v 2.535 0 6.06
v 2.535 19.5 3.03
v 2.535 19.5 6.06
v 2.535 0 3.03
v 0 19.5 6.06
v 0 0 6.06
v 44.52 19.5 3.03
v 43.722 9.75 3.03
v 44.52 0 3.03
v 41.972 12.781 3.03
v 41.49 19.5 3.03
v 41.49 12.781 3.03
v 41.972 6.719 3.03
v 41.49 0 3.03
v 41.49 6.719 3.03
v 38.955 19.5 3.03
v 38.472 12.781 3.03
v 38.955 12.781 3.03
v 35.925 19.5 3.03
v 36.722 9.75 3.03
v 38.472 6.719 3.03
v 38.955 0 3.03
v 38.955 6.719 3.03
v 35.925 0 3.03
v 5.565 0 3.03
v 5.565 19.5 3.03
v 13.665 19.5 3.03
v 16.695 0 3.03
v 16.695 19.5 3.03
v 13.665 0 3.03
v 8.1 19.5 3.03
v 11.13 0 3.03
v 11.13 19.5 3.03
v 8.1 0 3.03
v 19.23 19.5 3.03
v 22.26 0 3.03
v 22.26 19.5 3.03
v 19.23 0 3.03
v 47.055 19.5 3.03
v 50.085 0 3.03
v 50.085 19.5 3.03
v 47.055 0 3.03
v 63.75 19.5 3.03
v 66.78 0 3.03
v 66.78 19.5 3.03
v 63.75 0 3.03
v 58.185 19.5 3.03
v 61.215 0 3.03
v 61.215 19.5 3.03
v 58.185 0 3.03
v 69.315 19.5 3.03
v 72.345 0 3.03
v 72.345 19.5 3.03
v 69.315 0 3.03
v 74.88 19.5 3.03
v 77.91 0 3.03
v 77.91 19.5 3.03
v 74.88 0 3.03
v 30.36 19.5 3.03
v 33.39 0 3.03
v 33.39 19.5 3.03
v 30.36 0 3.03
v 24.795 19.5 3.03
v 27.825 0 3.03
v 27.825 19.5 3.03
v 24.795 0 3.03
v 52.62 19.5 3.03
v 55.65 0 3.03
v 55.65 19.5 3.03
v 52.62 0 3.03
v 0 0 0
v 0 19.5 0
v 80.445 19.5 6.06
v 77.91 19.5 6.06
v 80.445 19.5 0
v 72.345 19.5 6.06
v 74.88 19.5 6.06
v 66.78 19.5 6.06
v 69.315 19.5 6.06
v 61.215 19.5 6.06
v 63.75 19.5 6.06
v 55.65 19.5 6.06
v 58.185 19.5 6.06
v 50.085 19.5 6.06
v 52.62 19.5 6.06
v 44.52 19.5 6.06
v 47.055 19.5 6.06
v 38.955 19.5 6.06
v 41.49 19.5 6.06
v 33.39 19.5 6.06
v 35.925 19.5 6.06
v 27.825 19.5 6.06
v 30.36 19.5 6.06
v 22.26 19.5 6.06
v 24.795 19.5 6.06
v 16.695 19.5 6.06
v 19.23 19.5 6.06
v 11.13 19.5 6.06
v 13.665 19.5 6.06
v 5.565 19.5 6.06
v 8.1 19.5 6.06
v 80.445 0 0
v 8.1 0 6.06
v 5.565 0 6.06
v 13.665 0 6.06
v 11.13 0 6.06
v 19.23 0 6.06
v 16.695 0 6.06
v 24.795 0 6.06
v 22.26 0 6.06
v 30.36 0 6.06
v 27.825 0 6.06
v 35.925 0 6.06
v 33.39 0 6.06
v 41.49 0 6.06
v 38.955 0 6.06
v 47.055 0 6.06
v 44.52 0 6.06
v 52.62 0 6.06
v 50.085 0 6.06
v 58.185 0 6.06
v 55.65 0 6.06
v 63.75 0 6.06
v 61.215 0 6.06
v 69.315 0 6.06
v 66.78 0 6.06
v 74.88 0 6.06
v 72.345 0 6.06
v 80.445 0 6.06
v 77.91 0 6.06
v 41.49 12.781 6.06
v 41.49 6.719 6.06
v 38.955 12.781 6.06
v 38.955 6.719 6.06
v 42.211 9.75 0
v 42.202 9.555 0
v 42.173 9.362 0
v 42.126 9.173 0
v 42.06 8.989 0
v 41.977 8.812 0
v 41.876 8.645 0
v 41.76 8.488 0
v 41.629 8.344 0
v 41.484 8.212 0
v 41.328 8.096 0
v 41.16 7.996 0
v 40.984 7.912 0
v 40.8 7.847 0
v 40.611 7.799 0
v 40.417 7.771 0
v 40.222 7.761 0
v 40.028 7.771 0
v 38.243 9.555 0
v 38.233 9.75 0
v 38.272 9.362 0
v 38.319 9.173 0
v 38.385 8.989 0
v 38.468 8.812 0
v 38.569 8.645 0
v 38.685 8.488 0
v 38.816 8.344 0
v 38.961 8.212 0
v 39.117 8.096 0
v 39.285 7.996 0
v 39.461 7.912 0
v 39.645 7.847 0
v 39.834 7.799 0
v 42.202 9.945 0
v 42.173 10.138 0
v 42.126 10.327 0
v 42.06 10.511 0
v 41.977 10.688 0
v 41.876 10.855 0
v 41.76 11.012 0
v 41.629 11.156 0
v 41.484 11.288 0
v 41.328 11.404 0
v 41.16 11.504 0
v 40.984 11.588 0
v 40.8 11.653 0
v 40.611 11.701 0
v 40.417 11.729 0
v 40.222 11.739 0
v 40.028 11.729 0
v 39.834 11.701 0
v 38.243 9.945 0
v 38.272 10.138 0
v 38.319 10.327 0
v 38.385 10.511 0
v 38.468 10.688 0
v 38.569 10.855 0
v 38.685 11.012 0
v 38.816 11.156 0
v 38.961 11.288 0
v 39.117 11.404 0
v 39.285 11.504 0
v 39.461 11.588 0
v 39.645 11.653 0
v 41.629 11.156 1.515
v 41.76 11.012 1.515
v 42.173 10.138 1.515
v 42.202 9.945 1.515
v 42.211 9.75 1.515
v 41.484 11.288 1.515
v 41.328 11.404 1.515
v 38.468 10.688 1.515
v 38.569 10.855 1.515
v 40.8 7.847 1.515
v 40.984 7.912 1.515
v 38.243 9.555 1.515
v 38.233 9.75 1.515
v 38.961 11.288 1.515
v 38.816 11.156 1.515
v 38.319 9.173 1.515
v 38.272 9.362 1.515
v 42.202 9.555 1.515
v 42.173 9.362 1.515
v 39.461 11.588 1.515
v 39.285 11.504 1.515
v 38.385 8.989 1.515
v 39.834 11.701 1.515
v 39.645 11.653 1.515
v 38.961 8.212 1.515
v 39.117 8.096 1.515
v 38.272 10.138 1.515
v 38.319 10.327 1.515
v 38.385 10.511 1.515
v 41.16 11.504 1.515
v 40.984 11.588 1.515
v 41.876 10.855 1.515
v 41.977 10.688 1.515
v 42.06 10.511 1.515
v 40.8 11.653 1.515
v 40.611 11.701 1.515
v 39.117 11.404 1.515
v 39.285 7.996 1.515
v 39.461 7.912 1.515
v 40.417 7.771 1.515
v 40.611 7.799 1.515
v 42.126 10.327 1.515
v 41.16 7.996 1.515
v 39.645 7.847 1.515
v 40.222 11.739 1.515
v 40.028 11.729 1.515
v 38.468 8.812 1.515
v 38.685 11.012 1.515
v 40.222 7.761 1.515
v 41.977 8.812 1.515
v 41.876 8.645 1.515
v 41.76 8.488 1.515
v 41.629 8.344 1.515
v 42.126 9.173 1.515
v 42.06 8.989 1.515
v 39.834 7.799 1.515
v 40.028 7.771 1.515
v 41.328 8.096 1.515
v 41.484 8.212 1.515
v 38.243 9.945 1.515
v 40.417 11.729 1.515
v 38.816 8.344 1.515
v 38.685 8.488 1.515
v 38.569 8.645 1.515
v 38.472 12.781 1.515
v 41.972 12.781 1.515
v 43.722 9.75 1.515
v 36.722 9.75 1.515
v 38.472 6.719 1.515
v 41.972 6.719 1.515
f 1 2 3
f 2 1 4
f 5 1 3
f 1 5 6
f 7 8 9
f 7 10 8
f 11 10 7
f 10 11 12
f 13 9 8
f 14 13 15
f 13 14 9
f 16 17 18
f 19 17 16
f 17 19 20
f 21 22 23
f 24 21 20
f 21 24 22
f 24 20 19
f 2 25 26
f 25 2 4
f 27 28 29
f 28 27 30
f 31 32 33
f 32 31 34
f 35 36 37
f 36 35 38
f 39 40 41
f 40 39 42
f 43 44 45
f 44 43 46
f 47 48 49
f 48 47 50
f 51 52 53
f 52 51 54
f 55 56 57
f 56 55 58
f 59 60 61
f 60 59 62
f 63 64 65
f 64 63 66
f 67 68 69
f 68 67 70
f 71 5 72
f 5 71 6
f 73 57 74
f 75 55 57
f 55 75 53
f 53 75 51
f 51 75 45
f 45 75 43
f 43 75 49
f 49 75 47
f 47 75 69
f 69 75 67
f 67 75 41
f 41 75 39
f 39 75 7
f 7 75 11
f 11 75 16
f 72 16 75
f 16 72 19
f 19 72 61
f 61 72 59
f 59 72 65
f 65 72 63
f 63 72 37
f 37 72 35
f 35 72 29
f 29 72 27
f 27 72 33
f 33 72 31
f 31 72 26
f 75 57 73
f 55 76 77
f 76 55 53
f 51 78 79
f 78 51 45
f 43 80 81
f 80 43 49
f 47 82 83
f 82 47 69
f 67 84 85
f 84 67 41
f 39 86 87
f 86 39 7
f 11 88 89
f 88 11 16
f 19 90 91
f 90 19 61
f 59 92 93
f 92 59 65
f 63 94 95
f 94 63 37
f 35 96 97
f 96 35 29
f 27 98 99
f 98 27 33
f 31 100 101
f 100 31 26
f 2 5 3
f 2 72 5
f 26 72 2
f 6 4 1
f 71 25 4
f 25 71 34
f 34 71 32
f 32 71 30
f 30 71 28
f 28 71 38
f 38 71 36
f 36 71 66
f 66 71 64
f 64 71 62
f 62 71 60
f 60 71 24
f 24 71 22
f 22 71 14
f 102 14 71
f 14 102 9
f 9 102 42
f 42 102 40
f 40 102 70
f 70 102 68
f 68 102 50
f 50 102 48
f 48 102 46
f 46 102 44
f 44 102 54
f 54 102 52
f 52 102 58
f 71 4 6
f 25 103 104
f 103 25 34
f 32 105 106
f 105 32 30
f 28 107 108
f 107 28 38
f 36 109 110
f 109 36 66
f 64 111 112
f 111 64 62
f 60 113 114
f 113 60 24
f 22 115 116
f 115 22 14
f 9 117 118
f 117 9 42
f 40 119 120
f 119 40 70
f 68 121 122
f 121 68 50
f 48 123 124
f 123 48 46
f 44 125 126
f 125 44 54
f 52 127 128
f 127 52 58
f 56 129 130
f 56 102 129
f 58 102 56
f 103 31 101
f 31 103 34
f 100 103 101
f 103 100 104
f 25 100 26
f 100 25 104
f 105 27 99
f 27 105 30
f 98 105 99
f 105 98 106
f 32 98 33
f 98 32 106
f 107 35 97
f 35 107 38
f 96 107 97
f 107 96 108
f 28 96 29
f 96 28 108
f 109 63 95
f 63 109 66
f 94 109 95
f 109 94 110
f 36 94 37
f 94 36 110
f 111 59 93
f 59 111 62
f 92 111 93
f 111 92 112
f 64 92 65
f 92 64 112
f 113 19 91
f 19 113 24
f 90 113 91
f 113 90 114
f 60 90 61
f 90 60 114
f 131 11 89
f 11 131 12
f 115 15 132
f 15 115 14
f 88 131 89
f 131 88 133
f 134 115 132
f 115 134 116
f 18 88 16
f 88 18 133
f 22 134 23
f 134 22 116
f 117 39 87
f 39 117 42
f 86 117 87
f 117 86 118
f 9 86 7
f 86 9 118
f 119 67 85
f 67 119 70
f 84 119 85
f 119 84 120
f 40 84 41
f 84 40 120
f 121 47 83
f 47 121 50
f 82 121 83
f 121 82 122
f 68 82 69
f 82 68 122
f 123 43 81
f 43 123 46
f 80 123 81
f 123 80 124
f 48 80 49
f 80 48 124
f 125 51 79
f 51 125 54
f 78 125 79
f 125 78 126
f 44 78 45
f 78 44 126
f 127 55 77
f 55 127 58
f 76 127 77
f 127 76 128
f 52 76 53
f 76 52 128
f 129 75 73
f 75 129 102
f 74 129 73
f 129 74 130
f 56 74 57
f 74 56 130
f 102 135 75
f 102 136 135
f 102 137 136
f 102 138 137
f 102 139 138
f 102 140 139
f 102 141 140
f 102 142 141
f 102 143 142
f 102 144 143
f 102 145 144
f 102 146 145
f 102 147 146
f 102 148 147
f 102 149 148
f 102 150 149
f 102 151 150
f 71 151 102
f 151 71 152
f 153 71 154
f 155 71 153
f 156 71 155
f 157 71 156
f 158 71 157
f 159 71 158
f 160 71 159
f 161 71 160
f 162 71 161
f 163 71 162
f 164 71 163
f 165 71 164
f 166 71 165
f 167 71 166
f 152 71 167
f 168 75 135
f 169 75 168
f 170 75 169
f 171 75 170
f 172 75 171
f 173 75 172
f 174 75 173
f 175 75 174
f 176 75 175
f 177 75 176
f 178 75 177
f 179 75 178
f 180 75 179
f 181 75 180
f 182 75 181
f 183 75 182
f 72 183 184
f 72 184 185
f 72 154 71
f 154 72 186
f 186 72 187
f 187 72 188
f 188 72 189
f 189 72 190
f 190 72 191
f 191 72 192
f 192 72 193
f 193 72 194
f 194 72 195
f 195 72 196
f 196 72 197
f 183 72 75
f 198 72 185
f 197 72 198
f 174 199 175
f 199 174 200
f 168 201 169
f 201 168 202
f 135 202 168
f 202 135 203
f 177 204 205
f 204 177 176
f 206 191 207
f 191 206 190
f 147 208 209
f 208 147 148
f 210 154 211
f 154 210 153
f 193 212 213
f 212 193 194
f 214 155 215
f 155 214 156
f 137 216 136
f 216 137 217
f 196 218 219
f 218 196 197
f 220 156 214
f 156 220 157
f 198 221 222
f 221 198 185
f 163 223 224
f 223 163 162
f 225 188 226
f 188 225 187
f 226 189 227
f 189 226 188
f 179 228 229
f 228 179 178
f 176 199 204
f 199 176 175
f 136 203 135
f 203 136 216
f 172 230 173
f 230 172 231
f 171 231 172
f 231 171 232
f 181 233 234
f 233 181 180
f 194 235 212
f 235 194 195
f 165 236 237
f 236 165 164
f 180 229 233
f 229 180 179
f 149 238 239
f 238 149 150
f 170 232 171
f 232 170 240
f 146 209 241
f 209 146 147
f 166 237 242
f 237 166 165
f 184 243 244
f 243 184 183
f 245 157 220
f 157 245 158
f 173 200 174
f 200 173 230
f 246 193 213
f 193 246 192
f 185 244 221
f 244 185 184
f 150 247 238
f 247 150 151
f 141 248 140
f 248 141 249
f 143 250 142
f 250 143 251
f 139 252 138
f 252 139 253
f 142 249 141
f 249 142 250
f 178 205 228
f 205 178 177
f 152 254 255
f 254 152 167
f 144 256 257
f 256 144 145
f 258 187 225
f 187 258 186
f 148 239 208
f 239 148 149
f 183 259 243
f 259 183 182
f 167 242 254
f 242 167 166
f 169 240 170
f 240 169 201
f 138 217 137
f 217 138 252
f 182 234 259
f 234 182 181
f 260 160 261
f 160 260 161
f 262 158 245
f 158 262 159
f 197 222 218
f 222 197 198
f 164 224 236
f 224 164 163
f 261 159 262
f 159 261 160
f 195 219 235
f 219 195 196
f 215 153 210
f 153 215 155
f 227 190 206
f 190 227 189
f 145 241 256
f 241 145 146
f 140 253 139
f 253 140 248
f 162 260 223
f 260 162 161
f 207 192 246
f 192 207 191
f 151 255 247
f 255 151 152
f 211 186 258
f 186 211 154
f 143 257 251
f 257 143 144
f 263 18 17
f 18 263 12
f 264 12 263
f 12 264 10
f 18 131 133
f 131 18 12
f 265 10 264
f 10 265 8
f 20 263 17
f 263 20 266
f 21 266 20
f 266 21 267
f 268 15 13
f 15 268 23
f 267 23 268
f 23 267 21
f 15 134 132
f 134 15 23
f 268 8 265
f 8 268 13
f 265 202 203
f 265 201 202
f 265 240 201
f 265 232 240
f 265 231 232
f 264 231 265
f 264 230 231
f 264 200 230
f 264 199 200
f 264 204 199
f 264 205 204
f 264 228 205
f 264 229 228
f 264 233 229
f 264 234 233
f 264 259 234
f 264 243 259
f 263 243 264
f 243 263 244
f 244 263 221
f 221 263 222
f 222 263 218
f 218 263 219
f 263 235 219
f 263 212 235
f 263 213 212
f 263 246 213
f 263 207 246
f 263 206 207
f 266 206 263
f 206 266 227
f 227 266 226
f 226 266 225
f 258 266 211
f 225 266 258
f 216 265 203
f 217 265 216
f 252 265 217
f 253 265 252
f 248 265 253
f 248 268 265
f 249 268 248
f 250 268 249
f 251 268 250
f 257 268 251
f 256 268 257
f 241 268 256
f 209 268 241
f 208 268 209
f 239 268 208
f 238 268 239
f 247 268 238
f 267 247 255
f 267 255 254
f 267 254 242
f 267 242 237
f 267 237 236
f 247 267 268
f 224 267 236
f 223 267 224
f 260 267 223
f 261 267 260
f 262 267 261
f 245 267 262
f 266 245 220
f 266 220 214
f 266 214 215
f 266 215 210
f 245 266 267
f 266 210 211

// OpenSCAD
/*

        Super Customizable Lego Technic Beam
        Modified by Christopher Litsinger
        January 2018

    Inspired by TUSH - A remix of many!
    by spongybob1958, published Sep 7, 2017
    https://www.thingiverse.com/thing:2521463
*/

/* [Customize] */
//the maximum length of the overall rail
rail_length_max=80;
//the size of the gaps 
gap_length=3.03;
//the size of the peaks 
peak_length=2.535;
//how wide should the rail be
rail_width = 19.5;
//do you want screw tabs on the end?
screw_tabs = "no"; // [yes, no]
//do you want a center m4 hole?
center_hole="yes"; //[yes, no]
//what is the radius for the screws you're using to attach the rail
screw_radius = 3;

// preview[view:south, tilt:top]
// Model - Start

tab_offset = (screw_tabs == "yes") ? rail_width : 0;

segment_height = max(gap_length, peak_length);

num_segments = floor((rail_length_max - tab_offset)/(gap_length+peak_length));

module draw_tabs() {
    difference() {
        translate([num_segments*(gap_length+peak_length) + peak_length, rail_width/2, 0]) {
            cylinder(r=rail_width/2, h=segment_height*2, $fn=32);
            }
        translate([num_segments*(gap_length+peak_length) + peak_length - rail_width/2, 0, -1]) {
                cube([rail_width/2,rail_width, segment_height * 3]);
            }
        translate([num_segments*(gap_length+peak_length) + peak_length + screw_radius, rail_width/2, -1]) {
            cylinder(r=screw_radius, h=segment_height*3, $fn=32);
            }
        }
    difference() {
        translate([0, rail_width/2, 0]) {
            cylinder(r=rail_width/2, h=segment_height*2, $fn=32);
            }
        translate([0, 0, -1]) {
                cube([rail_width/2,rail_width, segment_height * 3]);
            }
        translate([-screw_radius, rail_width/2, -1]) {
            cylinder(r=screw_radius, h=segment_height*3, $fn=32);
            }
        }

}


module draw_center_hole() {
    translate([(num_segments*(gap_length+peak_length) + peak_length)/2, rail_width/2, -1]) {
        cylinder(r=1.989, h = segment_height *3, $fn=64);
        }
    translate([(num_segments*(gap_length+peak_length) + peak_length)/2, rail_width/2, segment_height - (segment_height/2)]) {
        cylinder(r=3.5, h=segment_height*2+1, $fn=6);
        }
}

difference() {
    union() {
        cube([(num_segments*(gap_length+peak_length) + peak_length), rail_width, segment_height]);
        for (ii = [0:num_segments]) {
                translate([ii*(gap_length+peak_length), 0, segment_height]) {
                    cube([(peak_length), rail_width, segment_height]);
                }
            }
        
        
        if (screw_tabs == "yes") {
            draw_tabs();
            }
        }    
    if (center_hole == "yes") draw_center_hole();
}
